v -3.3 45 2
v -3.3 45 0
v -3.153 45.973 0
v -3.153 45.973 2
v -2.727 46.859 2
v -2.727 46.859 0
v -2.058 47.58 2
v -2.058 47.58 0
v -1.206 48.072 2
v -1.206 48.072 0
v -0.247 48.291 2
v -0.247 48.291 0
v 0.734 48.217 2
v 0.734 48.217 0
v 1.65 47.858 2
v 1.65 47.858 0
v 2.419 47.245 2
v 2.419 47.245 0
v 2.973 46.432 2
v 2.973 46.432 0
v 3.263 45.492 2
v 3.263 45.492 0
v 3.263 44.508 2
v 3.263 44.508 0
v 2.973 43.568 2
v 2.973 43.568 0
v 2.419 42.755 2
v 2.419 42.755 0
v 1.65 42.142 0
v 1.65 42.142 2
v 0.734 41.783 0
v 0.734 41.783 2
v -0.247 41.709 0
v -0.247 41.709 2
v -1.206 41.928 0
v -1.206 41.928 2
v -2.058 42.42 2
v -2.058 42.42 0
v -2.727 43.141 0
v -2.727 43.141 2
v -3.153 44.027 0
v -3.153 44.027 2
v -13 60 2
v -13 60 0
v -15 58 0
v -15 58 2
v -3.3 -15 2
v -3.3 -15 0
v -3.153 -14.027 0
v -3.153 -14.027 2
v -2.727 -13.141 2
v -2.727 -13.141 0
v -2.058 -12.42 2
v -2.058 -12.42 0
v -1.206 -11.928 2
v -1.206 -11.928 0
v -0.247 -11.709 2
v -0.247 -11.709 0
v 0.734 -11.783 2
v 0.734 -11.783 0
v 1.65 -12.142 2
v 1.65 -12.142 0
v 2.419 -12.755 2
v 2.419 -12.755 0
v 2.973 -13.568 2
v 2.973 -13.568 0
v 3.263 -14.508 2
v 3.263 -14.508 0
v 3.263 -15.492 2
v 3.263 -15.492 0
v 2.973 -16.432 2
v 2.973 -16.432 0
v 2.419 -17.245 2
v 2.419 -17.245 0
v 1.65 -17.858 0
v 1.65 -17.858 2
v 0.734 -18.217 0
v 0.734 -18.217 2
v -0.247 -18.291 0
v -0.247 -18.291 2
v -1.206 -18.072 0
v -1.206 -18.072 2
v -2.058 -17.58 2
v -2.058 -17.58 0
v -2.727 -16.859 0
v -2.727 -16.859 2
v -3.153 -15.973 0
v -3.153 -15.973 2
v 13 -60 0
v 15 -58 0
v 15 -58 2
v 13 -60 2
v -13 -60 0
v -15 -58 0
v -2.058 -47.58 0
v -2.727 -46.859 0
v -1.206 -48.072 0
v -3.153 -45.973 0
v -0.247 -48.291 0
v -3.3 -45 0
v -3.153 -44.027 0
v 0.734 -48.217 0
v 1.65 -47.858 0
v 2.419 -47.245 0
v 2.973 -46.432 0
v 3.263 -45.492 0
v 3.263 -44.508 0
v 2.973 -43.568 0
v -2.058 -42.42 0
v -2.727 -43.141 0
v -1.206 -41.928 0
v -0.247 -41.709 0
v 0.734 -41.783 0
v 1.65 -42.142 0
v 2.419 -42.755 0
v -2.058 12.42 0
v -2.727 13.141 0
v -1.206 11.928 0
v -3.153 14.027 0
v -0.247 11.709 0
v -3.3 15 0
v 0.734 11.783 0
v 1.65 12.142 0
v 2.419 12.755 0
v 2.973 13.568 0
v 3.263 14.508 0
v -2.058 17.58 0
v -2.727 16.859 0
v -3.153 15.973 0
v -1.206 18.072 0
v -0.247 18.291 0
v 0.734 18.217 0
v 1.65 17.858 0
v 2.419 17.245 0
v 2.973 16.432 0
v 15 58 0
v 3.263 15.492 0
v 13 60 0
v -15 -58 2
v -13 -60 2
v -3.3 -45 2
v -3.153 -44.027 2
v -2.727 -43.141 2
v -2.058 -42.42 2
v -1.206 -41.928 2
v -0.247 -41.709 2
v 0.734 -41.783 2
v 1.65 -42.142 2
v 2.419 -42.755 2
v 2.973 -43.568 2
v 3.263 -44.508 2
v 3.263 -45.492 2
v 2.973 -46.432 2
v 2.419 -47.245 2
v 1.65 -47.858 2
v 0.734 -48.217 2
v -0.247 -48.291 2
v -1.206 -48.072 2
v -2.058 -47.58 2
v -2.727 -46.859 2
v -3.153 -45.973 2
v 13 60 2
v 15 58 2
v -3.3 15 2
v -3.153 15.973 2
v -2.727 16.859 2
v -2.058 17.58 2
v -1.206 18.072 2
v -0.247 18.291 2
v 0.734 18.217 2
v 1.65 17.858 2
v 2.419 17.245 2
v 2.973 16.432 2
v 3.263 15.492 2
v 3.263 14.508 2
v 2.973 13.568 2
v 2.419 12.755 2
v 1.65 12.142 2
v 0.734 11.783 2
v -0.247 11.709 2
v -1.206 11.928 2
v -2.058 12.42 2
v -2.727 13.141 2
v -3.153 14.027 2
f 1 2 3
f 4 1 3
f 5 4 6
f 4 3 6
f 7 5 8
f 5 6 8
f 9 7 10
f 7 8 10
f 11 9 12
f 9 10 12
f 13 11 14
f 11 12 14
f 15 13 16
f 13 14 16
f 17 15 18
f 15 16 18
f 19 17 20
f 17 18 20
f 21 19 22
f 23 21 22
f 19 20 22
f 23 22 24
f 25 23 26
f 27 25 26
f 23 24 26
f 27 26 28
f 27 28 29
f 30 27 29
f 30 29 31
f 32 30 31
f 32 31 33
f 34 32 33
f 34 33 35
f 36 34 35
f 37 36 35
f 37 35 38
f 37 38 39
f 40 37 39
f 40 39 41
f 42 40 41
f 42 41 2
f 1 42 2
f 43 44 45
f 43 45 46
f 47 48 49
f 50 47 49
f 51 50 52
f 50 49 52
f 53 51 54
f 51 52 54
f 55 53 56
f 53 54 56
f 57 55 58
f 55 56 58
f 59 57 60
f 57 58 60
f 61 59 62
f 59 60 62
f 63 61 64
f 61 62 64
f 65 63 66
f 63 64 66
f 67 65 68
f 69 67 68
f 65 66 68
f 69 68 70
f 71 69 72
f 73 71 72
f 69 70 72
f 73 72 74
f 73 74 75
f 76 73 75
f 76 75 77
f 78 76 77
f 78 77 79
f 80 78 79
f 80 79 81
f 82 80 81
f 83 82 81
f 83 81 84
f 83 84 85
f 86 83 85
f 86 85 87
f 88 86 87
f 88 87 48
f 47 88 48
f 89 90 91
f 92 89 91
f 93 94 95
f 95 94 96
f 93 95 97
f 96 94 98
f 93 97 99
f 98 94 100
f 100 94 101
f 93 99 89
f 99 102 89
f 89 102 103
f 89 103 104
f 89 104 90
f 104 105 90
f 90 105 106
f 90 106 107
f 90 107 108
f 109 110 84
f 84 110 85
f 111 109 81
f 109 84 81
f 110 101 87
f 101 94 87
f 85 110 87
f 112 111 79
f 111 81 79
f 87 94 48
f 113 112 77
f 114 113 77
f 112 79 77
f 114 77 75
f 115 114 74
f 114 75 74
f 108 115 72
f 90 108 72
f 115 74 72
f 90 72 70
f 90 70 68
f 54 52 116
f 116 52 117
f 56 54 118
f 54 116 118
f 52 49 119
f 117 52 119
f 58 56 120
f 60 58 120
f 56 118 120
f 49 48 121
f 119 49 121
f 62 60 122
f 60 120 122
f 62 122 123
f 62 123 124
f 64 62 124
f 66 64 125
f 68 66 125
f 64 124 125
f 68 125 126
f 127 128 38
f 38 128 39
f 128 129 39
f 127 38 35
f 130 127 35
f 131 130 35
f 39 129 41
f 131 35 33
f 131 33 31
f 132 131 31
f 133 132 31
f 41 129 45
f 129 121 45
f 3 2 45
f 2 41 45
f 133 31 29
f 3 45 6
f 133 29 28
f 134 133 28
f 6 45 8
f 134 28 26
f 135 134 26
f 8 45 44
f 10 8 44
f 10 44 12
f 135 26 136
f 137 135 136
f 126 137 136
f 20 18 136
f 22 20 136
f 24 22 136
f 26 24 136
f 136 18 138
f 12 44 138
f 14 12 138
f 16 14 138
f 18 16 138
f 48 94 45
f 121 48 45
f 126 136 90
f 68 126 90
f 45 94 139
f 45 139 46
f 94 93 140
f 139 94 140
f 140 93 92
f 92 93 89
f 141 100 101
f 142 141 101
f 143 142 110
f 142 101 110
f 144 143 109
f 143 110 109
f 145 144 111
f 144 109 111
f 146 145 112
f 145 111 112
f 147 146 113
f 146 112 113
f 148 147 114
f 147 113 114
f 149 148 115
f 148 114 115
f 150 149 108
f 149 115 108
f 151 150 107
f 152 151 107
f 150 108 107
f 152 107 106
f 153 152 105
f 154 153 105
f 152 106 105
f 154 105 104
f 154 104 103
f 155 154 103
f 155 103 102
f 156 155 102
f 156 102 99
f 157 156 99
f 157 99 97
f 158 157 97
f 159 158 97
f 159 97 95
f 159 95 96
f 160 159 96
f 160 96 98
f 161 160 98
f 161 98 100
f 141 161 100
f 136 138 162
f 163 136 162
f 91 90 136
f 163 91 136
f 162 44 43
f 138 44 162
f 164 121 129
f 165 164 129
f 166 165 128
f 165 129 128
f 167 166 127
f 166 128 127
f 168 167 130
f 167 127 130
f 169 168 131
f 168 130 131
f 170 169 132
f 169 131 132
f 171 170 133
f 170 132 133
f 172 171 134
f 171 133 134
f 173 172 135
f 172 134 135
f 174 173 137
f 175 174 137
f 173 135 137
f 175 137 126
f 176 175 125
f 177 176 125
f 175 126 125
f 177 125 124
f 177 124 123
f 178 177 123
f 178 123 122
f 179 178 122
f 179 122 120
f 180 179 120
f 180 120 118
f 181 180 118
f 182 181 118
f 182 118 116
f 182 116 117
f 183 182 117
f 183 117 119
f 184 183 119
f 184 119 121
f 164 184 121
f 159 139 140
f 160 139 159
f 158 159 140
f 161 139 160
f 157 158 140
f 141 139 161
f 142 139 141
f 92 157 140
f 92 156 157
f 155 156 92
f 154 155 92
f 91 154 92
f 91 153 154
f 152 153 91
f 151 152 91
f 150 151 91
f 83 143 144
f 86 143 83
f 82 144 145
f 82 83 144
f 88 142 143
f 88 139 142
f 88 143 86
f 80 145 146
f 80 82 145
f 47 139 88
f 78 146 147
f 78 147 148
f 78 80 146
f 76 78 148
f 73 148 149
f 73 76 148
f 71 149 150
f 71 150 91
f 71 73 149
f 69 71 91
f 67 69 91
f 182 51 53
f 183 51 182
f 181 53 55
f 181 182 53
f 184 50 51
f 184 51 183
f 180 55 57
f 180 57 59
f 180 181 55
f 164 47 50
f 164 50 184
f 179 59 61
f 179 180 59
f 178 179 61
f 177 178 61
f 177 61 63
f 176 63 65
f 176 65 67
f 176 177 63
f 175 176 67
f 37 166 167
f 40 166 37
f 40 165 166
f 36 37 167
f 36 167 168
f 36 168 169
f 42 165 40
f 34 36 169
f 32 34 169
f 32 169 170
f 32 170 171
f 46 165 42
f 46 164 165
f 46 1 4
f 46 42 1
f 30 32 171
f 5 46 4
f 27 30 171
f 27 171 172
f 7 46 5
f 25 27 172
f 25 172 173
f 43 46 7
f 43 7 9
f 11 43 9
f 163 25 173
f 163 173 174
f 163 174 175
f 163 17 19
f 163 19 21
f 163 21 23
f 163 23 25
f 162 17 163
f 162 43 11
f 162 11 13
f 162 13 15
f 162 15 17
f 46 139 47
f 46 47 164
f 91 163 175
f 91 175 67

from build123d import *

# Parameters (mm, degrees)
SKETCH_1_W        = 30
SKETCH_1_H        = 120
EXTRUDE_1_DEPTH   = 2
CHAMFER_1_SIZE    = 2
HOLE_WIZARD_M61_D = 6.6


with BuildPart() as part:
    # Эскиз1 → Бобышка-Вытянуть1 (new body)
    with BuildSketch(Plane.XY):
        Rectangle(SKETCH_1_W, SKETCH_1_H)
    extrude(amount=EXTRUDE_1_DEPTH)

    # Фаска1
    chamfer_1_edges = [part.edges().sort_by_distance(p)[0] for p in [
        (15, -60, 1),
        (-15, -60, 1),
        (-15, 60, 1),
        (15, 60, 1),
    ]]
    chamfer(chamfer_1_edges, length=CHAMFER_1_SIZE)

    # Отверстие с зазором M61 (through all)
    with Locations(Plane.XY.offset(2)):
        with Locations((0, -45), (0, 45), (0, 15), (0, -15)):
            Hole(HOLE_WIZARD_M61_D / 2)


solid = part.part
